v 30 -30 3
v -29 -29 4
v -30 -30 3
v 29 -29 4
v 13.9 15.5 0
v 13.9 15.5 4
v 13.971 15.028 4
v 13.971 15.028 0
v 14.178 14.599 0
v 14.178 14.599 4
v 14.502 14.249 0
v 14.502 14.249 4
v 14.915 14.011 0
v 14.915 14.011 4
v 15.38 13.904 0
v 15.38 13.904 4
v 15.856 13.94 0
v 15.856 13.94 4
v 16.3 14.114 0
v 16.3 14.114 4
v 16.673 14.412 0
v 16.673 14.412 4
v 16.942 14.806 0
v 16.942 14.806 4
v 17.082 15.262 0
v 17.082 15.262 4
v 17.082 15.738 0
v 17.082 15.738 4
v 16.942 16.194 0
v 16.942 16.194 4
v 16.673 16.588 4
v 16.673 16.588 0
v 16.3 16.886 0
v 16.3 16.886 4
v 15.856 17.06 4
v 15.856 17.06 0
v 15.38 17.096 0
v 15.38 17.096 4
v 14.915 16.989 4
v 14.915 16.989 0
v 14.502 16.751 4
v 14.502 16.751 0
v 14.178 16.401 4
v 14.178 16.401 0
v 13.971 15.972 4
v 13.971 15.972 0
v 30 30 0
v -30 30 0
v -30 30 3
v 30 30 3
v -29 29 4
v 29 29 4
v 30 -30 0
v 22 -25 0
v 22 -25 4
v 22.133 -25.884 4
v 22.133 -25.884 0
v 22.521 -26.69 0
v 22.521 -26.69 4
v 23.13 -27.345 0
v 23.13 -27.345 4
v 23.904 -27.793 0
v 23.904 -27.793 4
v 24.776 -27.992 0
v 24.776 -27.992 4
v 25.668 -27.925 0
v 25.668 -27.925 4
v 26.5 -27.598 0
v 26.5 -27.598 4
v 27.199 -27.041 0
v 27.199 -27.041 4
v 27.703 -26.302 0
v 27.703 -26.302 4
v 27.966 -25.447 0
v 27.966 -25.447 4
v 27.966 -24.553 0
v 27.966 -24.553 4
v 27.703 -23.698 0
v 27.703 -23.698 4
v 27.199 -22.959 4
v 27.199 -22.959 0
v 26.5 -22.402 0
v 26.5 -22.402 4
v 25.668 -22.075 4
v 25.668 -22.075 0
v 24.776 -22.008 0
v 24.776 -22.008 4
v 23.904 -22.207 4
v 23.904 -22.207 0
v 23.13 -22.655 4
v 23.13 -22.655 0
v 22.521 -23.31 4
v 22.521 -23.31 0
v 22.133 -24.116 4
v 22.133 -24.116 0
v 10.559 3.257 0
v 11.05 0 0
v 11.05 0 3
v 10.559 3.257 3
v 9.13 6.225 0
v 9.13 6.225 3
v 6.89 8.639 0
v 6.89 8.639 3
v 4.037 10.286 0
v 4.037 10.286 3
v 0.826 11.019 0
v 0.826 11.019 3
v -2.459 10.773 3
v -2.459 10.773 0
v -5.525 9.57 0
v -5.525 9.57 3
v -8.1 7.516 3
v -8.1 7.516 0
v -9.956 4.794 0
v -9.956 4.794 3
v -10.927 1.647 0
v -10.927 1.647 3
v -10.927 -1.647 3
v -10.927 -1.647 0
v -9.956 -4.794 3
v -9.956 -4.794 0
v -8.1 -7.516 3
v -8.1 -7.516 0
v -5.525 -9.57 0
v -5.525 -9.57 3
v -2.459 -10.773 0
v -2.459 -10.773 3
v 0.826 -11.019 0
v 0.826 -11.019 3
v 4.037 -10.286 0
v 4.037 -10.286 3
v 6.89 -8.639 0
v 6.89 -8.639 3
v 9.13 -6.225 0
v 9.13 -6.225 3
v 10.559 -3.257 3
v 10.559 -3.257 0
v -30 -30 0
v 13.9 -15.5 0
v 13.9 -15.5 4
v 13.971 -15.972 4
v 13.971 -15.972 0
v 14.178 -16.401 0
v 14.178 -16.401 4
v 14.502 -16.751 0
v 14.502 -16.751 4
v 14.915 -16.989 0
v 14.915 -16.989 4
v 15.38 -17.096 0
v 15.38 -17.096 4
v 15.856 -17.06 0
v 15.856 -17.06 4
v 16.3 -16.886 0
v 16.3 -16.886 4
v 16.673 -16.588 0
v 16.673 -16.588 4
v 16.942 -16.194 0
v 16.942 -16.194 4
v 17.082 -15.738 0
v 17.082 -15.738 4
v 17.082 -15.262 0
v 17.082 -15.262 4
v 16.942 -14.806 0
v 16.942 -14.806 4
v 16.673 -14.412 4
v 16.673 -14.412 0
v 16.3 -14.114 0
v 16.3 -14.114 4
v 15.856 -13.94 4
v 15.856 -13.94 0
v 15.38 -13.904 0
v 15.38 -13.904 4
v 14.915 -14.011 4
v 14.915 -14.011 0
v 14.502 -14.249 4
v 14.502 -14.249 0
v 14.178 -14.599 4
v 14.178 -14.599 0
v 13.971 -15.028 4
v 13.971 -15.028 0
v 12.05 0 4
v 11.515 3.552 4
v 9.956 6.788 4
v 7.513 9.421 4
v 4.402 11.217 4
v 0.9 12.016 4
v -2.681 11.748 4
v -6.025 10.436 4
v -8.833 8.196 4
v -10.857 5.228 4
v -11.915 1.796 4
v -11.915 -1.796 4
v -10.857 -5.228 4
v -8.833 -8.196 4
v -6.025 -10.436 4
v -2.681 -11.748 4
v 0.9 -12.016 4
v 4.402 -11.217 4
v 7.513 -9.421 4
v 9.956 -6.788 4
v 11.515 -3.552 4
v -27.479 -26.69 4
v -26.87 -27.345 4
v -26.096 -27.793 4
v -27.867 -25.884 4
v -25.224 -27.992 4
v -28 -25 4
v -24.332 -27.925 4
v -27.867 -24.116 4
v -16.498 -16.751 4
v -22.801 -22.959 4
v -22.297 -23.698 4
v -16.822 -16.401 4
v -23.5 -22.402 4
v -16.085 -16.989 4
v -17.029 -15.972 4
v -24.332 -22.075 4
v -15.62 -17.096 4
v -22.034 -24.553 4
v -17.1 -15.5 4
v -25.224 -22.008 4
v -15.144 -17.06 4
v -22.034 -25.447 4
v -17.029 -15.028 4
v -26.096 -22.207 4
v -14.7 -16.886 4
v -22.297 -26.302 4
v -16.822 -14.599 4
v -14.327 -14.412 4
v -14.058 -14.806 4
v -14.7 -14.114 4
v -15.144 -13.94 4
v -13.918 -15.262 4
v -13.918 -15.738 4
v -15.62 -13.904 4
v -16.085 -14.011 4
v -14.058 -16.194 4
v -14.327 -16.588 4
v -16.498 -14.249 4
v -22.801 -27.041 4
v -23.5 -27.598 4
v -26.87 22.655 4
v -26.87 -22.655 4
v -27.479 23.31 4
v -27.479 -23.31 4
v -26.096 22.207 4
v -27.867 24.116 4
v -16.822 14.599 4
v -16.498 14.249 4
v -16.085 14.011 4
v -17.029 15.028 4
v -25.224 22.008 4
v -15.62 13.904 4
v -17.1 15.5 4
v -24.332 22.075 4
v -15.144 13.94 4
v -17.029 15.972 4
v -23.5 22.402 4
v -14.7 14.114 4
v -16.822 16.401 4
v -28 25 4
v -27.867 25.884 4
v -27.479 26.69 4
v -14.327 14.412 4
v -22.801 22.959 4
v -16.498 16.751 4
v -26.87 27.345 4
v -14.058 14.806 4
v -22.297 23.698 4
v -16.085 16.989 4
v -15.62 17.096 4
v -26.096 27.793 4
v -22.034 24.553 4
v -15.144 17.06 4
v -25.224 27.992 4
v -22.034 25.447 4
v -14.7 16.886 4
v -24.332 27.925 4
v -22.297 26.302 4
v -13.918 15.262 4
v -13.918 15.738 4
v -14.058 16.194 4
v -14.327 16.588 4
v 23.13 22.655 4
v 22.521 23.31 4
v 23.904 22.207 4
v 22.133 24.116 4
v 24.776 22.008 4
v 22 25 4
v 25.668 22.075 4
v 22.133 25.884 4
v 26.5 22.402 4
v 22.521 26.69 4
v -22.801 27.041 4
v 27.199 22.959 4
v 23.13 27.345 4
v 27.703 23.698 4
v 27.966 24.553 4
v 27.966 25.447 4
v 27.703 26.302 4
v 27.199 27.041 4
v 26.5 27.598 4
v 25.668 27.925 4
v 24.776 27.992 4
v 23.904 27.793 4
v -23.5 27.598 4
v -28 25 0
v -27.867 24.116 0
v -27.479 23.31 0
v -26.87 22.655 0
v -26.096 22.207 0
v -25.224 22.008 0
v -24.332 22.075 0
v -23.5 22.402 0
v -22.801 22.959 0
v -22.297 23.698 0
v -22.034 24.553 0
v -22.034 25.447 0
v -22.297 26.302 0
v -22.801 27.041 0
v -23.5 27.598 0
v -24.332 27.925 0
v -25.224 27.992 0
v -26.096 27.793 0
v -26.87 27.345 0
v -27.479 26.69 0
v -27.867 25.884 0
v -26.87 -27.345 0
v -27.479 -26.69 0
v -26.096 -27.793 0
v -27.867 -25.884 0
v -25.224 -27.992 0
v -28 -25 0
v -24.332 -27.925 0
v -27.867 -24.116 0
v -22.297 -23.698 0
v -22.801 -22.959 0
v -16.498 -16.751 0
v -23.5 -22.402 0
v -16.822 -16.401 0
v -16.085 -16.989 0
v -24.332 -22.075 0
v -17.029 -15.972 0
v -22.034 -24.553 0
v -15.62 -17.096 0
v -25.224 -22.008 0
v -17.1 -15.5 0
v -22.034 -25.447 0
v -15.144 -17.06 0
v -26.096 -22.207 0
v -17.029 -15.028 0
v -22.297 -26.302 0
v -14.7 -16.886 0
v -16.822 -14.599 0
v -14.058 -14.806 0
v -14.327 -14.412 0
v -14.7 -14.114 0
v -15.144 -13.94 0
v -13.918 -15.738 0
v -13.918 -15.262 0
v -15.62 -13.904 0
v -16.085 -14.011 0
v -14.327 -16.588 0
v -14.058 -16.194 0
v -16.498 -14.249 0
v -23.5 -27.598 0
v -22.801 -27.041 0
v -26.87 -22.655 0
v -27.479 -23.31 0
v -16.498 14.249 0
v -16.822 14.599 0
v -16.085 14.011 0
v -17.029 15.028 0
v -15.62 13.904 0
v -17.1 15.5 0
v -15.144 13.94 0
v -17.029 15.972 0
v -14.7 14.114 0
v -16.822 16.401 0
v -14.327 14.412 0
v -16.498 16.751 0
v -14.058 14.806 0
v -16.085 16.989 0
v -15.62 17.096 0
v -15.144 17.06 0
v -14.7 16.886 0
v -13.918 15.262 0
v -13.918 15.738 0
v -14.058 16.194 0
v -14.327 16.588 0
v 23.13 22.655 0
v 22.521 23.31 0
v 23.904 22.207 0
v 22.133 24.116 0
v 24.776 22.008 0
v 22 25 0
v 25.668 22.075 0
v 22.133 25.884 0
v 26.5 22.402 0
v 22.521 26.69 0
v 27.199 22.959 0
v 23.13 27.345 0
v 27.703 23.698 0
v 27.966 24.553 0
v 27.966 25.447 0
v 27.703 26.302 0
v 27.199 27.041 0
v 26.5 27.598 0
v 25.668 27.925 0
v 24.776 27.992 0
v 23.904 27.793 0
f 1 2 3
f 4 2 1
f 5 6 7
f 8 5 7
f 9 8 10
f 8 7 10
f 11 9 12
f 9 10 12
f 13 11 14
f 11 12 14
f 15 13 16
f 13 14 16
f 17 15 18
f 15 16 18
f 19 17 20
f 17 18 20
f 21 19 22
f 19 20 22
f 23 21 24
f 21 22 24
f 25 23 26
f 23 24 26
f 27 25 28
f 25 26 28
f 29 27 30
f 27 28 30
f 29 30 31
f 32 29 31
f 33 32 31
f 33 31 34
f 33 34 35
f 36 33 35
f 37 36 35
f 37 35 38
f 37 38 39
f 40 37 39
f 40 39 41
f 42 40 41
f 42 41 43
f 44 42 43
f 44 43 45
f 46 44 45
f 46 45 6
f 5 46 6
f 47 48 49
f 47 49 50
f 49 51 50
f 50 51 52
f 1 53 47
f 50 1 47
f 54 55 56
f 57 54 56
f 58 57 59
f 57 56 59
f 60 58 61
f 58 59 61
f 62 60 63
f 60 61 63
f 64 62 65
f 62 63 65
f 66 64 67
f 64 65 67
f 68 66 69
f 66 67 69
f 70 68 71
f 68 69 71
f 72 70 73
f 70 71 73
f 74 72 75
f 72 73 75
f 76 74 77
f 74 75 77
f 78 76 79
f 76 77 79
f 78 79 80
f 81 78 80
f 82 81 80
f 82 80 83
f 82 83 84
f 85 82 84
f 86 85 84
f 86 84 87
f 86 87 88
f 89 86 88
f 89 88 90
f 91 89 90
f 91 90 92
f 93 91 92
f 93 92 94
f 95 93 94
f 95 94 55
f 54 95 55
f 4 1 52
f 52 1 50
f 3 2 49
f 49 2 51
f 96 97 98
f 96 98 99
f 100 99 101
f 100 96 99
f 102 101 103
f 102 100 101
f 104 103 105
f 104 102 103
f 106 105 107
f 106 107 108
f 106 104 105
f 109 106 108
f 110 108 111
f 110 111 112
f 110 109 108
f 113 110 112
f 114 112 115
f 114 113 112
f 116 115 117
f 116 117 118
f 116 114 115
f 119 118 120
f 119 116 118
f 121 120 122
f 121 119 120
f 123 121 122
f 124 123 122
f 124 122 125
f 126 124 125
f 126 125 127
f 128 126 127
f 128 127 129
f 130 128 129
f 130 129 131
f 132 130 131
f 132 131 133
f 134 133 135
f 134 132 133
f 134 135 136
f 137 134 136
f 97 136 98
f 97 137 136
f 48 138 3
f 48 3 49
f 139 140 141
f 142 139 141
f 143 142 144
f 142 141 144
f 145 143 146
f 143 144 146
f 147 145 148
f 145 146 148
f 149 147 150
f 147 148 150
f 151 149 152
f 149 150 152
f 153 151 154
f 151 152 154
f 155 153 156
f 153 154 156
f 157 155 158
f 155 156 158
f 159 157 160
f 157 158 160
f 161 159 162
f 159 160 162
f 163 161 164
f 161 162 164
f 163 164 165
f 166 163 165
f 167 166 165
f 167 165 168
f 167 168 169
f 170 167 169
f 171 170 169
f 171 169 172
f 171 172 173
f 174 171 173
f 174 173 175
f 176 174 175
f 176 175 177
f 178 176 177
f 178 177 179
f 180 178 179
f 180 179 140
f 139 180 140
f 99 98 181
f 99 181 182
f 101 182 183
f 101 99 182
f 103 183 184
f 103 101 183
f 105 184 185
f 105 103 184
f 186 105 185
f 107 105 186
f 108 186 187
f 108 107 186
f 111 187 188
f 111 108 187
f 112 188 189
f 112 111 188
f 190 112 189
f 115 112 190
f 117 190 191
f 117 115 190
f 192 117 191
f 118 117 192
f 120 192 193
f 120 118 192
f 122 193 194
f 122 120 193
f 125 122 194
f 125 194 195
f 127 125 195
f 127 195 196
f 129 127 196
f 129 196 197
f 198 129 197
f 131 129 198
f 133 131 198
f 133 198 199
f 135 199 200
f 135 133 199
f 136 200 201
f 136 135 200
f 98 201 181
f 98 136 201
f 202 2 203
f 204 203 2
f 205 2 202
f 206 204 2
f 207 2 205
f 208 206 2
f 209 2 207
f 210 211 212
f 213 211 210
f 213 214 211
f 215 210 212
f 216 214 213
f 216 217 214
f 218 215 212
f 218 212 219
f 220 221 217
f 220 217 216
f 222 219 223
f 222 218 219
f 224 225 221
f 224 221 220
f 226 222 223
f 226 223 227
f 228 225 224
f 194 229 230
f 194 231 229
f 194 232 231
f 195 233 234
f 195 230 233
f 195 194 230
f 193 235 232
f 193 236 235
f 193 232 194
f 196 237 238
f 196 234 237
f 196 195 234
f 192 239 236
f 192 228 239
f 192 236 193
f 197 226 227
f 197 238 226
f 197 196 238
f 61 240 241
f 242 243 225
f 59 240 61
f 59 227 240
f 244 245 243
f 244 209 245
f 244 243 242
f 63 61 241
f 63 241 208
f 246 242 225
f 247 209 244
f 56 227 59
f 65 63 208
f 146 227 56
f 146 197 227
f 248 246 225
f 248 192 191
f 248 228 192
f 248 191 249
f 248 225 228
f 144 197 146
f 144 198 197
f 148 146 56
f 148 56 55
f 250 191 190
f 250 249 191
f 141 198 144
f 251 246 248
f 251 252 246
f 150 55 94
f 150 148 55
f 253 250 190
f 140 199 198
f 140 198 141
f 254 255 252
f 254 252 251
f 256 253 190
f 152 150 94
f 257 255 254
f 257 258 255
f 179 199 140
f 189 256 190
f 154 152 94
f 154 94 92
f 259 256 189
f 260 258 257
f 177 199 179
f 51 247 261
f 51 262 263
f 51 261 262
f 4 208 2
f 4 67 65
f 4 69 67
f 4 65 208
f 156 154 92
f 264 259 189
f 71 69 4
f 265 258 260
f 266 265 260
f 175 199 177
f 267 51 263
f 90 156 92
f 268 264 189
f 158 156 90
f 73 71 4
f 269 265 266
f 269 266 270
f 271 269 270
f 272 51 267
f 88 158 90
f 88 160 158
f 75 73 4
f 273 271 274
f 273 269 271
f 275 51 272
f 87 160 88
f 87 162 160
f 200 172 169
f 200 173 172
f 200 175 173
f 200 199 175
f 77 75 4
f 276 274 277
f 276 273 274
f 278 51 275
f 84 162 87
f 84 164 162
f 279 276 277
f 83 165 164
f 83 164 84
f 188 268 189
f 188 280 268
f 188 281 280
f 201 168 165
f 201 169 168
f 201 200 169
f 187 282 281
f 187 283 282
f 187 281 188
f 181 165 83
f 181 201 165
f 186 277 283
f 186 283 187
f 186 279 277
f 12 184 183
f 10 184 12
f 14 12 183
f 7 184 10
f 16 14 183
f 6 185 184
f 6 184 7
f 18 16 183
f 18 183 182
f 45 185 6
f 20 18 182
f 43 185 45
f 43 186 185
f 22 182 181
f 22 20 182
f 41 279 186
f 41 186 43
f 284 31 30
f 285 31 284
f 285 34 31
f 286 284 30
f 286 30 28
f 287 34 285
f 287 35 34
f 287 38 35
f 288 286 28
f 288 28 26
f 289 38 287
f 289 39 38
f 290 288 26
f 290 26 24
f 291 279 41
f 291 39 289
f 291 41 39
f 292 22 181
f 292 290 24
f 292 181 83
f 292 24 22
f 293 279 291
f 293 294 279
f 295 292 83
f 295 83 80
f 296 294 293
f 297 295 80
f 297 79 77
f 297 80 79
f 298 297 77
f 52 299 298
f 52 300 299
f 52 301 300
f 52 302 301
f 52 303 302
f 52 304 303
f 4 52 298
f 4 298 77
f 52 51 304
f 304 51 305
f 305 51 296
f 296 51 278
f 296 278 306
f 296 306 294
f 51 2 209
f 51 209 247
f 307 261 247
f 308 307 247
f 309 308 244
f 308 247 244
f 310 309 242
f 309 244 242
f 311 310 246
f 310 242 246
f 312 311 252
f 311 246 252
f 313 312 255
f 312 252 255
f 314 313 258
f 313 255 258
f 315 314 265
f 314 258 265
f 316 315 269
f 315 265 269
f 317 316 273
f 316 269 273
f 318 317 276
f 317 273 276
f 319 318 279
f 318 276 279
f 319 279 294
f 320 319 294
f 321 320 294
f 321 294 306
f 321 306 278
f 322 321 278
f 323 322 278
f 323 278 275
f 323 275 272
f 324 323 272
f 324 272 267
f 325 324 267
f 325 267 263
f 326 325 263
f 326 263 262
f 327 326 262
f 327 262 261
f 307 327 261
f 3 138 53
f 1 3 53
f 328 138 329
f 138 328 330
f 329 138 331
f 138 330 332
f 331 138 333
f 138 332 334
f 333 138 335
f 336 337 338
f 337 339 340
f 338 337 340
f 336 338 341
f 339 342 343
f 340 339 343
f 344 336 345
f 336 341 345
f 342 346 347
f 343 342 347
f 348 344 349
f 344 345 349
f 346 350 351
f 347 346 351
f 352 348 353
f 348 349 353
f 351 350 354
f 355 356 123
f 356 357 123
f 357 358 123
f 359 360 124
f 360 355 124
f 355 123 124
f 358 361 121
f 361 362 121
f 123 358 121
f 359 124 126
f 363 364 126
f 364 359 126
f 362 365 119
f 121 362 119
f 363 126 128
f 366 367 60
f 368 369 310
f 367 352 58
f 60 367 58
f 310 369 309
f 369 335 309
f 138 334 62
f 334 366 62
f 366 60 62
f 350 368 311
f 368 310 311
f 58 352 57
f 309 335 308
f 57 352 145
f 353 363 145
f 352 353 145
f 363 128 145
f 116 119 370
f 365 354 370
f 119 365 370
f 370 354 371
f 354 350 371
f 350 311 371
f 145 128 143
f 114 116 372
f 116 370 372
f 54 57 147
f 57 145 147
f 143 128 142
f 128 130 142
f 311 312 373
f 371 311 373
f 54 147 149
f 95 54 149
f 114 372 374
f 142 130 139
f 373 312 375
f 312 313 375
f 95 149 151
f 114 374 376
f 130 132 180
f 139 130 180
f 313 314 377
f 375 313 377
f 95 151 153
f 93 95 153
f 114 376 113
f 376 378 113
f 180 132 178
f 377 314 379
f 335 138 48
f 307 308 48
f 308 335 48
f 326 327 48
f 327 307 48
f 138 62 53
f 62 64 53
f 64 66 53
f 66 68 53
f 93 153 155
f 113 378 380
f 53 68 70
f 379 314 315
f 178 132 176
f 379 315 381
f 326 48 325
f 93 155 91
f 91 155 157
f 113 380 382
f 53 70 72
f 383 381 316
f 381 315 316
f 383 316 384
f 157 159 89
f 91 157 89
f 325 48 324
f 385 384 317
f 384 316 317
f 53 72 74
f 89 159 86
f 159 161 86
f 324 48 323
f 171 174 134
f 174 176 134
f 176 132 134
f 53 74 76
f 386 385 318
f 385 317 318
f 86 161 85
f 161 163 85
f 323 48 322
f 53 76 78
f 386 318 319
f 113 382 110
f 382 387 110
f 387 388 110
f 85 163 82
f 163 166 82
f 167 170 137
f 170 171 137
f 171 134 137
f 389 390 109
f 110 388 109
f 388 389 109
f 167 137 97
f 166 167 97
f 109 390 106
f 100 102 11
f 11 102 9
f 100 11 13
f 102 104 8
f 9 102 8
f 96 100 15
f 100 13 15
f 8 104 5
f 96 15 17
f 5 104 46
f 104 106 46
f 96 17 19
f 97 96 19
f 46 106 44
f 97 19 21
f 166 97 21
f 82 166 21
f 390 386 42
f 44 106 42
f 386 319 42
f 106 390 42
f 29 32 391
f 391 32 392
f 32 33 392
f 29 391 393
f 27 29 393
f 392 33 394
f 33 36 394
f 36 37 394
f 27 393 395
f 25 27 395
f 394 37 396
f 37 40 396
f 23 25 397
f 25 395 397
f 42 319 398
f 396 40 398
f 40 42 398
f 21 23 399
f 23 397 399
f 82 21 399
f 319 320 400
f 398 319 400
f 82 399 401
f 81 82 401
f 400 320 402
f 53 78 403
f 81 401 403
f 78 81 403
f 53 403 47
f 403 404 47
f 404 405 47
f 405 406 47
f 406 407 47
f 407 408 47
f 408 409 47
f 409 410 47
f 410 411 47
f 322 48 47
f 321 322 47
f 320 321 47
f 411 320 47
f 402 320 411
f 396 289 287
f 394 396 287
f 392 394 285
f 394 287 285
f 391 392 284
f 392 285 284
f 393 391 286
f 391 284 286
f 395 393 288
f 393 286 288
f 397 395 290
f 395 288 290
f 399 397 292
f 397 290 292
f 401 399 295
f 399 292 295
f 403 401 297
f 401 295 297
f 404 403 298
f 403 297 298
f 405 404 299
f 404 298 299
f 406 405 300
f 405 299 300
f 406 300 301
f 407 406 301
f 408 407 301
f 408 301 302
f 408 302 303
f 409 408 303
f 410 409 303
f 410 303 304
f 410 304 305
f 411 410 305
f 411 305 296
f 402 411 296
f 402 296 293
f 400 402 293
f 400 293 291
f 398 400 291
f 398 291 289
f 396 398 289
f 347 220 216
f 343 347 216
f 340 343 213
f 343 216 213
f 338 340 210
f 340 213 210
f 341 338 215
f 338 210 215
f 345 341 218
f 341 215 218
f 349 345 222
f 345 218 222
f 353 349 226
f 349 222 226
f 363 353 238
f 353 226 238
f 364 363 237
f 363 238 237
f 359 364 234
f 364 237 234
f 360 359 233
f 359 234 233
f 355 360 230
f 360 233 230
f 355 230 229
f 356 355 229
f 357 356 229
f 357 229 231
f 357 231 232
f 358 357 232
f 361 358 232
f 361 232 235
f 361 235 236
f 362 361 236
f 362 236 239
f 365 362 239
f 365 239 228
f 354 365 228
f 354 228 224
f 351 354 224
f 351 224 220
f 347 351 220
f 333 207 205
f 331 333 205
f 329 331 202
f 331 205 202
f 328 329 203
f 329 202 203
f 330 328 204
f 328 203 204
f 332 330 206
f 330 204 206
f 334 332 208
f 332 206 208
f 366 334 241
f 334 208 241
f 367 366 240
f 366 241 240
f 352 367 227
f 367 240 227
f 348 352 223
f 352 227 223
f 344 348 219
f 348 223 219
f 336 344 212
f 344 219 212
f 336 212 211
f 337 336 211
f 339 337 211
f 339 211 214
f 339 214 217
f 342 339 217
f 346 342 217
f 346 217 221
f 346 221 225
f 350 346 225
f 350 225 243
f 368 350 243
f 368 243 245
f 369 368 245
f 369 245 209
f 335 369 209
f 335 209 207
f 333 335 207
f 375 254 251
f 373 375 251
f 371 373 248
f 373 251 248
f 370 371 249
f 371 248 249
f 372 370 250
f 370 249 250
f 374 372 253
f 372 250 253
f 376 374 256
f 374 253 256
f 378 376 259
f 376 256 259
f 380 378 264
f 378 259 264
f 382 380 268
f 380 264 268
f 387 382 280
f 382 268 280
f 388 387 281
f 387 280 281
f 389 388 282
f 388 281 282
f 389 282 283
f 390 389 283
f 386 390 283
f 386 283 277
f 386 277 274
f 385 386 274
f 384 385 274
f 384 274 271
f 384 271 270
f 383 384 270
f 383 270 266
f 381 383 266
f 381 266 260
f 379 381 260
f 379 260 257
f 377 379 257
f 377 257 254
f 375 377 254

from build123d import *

# Parameters (mm, degrees)
F0_W     = 60
F0_H     = 60
F0_R     = 11.05
F1_DEPTH = 4
F2_D     = 3.2
F3_D     = 6
F4_SIZE  = 1


with BuildPart() as f1:
    # F0 (on Top) → F1 (new body)
    with BuildSketch(Plane.XY):
        Rectangle(F0_W, F0_H)
        Circle(F0_R, mode=Mode.SUBTRACT)
    extrude(amount=F1_DEPTH)

    # F2 (through all)
    with Locations(Plane(origin=(0, 0, 0), x_dir=(1, 0, 0), z_dir=(0, 0, -1))):
        with Locations((15.5, 15.5), (15.5, -15.5), (-15.5, -15.5), (-15.5, 15.5)):
            Hole(F2_D / 2)

    # F3 (through all)
    with Locations(Plane(origin=(0, 0, 0), x_dir=(1, 0, 0), z_dir=(0, 0, -1))):
        with Locations((-25, -25), (25, -25), (25, 25), (-25, 25)):
            Hole(F3_D / 2)

    # F4
    f4_edges = [f1.edges().sort_by_distance(p)[0] for p in [
        (-11.05, 0, 4),
        (0, -30, 4),
        (-30, 0, 4),
        (0, 30, 4),
        (30, 0, 4),
    ]]
    chamfer(f4_edges, length=F4_SIZE)


solid = f1.part
